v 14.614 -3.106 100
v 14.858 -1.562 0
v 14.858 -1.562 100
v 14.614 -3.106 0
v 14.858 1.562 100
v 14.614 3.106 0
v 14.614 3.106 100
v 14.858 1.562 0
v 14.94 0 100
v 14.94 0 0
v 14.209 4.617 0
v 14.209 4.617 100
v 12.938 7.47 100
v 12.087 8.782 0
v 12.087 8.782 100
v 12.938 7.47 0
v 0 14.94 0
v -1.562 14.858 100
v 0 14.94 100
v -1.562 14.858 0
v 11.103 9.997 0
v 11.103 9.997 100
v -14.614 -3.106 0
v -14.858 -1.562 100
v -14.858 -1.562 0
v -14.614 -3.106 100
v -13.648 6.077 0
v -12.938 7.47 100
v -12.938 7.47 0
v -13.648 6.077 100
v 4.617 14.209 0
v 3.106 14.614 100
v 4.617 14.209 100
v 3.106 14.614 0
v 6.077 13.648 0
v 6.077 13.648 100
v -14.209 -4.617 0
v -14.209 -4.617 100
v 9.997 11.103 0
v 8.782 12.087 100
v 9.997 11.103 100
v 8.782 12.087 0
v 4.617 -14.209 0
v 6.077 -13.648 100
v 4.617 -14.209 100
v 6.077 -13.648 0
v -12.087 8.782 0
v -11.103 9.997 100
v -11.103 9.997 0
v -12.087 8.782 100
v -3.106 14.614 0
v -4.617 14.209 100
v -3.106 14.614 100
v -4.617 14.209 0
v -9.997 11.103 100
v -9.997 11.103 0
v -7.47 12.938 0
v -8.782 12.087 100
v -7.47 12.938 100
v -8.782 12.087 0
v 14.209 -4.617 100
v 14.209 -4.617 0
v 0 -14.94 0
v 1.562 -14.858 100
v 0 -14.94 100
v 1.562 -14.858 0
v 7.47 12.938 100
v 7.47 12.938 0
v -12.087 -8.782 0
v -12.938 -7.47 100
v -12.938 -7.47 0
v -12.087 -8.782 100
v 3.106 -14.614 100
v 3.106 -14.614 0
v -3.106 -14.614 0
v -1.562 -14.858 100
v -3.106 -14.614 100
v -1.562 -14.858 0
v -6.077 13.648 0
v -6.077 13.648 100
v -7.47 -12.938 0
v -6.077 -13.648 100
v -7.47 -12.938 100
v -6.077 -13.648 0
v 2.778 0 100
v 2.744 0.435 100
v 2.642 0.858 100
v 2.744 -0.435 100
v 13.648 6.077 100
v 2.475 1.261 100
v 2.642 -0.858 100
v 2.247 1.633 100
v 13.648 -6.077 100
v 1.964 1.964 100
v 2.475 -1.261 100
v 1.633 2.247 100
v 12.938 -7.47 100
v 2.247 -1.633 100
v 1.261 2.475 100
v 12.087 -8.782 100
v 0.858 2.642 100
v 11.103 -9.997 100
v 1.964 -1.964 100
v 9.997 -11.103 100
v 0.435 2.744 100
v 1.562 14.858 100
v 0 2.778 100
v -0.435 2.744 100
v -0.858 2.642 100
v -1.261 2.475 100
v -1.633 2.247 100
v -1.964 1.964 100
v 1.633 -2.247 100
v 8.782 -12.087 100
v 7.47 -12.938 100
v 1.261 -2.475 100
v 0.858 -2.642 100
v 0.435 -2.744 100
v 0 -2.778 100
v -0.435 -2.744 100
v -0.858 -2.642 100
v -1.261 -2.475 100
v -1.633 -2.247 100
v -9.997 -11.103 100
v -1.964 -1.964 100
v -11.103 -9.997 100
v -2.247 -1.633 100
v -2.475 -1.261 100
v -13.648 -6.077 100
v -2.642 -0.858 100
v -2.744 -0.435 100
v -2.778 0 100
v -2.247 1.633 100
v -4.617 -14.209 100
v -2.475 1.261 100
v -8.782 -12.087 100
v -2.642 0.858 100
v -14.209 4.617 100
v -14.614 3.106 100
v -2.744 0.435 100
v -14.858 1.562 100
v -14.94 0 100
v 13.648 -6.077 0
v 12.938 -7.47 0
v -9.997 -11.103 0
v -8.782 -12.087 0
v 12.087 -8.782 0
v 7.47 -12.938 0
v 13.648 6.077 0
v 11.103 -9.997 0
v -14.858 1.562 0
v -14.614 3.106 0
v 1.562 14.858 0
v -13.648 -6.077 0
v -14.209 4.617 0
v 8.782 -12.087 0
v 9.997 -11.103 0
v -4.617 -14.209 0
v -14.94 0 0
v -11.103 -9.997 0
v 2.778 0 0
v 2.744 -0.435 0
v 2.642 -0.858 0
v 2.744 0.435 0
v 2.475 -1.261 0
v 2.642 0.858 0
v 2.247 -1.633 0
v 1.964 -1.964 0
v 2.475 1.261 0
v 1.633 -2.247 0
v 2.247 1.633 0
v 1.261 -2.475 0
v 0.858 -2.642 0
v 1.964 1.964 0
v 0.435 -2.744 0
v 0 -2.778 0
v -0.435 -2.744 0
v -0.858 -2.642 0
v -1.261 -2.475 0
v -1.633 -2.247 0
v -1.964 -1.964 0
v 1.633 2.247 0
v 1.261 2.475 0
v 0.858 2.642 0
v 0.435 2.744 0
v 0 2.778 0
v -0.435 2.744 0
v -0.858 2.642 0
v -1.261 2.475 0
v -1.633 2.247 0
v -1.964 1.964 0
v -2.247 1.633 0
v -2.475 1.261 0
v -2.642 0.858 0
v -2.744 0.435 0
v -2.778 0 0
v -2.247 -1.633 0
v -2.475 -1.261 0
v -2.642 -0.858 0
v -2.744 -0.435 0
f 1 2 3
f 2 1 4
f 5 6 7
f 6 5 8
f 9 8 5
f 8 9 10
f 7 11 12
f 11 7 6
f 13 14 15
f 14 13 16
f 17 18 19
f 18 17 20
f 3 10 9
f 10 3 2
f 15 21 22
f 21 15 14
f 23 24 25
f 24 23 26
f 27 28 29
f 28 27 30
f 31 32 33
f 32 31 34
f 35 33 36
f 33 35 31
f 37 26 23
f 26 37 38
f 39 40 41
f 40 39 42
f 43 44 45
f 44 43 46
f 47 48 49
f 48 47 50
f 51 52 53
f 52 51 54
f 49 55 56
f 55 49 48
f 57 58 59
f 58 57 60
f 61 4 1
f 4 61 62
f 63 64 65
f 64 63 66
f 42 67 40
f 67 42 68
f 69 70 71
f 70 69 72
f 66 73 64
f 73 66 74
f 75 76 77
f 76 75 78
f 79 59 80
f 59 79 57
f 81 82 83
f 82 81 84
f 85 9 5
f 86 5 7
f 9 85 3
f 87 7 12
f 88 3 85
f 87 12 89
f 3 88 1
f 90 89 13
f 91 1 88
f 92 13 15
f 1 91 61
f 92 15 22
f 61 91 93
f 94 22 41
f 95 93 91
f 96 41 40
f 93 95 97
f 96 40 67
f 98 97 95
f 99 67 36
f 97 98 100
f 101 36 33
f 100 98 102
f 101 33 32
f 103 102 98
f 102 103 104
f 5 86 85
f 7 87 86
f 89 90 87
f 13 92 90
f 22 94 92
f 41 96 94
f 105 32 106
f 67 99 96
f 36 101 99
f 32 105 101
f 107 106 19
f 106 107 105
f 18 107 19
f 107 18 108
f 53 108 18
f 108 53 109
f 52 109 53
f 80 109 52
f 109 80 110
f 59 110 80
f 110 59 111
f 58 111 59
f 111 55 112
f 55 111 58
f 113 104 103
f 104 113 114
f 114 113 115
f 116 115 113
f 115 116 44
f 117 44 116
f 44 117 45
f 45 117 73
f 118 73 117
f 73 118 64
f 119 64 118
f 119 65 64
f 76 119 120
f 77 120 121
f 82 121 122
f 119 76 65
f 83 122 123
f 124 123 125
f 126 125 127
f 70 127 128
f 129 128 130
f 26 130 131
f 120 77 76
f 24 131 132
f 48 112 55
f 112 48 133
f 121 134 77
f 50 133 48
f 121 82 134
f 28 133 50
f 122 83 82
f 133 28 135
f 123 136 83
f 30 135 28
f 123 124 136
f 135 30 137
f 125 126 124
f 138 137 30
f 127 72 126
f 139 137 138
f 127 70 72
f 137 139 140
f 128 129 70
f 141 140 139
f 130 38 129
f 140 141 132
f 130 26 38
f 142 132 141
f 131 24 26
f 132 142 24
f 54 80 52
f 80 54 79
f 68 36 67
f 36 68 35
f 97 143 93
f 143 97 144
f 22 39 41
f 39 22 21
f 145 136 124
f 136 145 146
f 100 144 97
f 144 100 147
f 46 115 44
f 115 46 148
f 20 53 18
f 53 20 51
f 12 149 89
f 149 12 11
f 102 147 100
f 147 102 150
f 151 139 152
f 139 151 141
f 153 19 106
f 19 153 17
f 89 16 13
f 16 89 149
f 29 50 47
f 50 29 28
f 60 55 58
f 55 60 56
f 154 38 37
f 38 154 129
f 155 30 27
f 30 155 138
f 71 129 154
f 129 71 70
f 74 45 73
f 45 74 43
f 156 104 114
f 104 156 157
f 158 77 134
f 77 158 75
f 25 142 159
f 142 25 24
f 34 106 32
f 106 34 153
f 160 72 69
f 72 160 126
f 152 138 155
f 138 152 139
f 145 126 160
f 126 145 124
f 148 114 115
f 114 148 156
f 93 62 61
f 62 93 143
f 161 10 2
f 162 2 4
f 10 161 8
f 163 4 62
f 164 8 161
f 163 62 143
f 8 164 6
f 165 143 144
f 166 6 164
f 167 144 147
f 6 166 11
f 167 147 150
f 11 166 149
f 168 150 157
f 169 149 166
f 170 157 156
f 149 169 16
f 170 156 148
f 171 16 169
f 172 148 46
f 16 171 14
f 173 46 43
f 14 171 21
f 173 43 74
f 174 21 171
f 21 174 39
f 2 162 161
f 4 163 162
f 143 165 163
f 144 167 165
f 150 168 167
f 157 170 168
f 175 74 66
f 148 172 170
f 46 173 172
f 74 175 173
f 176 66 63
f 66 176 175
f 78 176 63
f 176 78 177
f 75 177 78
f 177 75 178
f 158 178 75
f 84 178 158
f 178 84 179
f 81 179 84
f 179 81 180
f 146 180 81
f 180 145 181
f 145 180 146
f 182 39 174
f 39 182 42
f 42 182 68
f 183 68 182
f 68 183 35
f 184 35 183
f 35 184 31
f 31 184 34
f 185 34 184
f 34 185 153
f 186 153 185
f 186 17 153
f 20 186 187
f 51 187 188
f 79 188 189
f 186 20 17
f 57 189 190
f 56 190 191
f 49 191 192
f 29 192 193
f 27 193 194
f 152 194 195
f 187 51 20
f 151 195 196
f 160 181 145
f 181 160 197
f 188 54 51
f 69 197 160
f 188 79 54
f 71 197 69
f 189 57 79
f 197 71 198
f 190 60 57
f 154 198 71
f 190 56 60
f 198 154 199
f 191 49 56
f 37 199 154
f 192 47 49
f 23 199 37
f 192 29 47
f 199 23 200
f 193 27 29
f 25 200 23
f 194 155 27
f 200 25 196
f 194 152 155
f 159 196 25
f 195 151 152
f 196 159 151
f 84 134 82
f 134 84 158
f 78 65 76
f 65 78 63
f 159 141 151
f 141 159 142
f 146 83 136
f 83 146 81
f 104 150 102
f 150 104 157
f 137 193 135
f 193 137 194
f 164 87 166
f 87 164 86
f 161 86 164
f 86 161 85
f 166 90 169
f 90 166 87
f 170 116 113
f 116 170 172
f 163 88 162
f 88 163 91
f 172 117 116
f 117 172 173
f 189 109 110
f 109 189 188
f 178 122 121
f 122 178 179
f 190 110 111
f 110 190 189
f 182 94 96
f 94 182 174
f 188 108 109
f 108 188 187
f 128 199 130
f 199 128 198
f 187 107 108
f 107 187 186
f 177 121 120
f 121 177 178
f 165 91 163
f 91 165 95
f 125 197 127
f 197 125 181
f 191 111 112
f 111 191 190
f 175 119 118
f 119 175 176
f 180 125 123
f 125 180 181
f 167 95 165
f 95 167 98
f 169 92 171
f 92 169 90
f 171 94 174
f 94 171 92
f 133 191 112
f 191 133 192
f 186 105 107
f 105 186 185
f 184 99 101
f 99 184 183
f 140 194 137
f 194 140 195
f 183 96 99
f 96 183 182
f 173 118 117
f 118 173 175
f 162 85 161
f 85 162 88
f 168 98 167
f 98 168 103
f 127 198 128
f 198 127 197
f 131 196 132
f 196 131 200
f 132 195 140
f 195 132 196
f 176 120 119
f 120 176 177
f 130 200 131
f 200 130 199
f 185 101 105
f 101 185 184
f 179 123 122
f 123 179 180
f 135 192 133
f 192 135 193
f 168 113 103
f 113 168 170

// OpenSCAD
        wall_thickness = 2.83;
        bore_clearance = 0.778;
        roller_radius = 14.94;

        module roller() {
            difference() {
                cylinder(h=100, r=roller_radius, $fn=60);
                translate([0,0,-5])
                    cylinder(h=110, r=bore_clearance + 2, $fn=40);
            }
        }
        roller();
        
